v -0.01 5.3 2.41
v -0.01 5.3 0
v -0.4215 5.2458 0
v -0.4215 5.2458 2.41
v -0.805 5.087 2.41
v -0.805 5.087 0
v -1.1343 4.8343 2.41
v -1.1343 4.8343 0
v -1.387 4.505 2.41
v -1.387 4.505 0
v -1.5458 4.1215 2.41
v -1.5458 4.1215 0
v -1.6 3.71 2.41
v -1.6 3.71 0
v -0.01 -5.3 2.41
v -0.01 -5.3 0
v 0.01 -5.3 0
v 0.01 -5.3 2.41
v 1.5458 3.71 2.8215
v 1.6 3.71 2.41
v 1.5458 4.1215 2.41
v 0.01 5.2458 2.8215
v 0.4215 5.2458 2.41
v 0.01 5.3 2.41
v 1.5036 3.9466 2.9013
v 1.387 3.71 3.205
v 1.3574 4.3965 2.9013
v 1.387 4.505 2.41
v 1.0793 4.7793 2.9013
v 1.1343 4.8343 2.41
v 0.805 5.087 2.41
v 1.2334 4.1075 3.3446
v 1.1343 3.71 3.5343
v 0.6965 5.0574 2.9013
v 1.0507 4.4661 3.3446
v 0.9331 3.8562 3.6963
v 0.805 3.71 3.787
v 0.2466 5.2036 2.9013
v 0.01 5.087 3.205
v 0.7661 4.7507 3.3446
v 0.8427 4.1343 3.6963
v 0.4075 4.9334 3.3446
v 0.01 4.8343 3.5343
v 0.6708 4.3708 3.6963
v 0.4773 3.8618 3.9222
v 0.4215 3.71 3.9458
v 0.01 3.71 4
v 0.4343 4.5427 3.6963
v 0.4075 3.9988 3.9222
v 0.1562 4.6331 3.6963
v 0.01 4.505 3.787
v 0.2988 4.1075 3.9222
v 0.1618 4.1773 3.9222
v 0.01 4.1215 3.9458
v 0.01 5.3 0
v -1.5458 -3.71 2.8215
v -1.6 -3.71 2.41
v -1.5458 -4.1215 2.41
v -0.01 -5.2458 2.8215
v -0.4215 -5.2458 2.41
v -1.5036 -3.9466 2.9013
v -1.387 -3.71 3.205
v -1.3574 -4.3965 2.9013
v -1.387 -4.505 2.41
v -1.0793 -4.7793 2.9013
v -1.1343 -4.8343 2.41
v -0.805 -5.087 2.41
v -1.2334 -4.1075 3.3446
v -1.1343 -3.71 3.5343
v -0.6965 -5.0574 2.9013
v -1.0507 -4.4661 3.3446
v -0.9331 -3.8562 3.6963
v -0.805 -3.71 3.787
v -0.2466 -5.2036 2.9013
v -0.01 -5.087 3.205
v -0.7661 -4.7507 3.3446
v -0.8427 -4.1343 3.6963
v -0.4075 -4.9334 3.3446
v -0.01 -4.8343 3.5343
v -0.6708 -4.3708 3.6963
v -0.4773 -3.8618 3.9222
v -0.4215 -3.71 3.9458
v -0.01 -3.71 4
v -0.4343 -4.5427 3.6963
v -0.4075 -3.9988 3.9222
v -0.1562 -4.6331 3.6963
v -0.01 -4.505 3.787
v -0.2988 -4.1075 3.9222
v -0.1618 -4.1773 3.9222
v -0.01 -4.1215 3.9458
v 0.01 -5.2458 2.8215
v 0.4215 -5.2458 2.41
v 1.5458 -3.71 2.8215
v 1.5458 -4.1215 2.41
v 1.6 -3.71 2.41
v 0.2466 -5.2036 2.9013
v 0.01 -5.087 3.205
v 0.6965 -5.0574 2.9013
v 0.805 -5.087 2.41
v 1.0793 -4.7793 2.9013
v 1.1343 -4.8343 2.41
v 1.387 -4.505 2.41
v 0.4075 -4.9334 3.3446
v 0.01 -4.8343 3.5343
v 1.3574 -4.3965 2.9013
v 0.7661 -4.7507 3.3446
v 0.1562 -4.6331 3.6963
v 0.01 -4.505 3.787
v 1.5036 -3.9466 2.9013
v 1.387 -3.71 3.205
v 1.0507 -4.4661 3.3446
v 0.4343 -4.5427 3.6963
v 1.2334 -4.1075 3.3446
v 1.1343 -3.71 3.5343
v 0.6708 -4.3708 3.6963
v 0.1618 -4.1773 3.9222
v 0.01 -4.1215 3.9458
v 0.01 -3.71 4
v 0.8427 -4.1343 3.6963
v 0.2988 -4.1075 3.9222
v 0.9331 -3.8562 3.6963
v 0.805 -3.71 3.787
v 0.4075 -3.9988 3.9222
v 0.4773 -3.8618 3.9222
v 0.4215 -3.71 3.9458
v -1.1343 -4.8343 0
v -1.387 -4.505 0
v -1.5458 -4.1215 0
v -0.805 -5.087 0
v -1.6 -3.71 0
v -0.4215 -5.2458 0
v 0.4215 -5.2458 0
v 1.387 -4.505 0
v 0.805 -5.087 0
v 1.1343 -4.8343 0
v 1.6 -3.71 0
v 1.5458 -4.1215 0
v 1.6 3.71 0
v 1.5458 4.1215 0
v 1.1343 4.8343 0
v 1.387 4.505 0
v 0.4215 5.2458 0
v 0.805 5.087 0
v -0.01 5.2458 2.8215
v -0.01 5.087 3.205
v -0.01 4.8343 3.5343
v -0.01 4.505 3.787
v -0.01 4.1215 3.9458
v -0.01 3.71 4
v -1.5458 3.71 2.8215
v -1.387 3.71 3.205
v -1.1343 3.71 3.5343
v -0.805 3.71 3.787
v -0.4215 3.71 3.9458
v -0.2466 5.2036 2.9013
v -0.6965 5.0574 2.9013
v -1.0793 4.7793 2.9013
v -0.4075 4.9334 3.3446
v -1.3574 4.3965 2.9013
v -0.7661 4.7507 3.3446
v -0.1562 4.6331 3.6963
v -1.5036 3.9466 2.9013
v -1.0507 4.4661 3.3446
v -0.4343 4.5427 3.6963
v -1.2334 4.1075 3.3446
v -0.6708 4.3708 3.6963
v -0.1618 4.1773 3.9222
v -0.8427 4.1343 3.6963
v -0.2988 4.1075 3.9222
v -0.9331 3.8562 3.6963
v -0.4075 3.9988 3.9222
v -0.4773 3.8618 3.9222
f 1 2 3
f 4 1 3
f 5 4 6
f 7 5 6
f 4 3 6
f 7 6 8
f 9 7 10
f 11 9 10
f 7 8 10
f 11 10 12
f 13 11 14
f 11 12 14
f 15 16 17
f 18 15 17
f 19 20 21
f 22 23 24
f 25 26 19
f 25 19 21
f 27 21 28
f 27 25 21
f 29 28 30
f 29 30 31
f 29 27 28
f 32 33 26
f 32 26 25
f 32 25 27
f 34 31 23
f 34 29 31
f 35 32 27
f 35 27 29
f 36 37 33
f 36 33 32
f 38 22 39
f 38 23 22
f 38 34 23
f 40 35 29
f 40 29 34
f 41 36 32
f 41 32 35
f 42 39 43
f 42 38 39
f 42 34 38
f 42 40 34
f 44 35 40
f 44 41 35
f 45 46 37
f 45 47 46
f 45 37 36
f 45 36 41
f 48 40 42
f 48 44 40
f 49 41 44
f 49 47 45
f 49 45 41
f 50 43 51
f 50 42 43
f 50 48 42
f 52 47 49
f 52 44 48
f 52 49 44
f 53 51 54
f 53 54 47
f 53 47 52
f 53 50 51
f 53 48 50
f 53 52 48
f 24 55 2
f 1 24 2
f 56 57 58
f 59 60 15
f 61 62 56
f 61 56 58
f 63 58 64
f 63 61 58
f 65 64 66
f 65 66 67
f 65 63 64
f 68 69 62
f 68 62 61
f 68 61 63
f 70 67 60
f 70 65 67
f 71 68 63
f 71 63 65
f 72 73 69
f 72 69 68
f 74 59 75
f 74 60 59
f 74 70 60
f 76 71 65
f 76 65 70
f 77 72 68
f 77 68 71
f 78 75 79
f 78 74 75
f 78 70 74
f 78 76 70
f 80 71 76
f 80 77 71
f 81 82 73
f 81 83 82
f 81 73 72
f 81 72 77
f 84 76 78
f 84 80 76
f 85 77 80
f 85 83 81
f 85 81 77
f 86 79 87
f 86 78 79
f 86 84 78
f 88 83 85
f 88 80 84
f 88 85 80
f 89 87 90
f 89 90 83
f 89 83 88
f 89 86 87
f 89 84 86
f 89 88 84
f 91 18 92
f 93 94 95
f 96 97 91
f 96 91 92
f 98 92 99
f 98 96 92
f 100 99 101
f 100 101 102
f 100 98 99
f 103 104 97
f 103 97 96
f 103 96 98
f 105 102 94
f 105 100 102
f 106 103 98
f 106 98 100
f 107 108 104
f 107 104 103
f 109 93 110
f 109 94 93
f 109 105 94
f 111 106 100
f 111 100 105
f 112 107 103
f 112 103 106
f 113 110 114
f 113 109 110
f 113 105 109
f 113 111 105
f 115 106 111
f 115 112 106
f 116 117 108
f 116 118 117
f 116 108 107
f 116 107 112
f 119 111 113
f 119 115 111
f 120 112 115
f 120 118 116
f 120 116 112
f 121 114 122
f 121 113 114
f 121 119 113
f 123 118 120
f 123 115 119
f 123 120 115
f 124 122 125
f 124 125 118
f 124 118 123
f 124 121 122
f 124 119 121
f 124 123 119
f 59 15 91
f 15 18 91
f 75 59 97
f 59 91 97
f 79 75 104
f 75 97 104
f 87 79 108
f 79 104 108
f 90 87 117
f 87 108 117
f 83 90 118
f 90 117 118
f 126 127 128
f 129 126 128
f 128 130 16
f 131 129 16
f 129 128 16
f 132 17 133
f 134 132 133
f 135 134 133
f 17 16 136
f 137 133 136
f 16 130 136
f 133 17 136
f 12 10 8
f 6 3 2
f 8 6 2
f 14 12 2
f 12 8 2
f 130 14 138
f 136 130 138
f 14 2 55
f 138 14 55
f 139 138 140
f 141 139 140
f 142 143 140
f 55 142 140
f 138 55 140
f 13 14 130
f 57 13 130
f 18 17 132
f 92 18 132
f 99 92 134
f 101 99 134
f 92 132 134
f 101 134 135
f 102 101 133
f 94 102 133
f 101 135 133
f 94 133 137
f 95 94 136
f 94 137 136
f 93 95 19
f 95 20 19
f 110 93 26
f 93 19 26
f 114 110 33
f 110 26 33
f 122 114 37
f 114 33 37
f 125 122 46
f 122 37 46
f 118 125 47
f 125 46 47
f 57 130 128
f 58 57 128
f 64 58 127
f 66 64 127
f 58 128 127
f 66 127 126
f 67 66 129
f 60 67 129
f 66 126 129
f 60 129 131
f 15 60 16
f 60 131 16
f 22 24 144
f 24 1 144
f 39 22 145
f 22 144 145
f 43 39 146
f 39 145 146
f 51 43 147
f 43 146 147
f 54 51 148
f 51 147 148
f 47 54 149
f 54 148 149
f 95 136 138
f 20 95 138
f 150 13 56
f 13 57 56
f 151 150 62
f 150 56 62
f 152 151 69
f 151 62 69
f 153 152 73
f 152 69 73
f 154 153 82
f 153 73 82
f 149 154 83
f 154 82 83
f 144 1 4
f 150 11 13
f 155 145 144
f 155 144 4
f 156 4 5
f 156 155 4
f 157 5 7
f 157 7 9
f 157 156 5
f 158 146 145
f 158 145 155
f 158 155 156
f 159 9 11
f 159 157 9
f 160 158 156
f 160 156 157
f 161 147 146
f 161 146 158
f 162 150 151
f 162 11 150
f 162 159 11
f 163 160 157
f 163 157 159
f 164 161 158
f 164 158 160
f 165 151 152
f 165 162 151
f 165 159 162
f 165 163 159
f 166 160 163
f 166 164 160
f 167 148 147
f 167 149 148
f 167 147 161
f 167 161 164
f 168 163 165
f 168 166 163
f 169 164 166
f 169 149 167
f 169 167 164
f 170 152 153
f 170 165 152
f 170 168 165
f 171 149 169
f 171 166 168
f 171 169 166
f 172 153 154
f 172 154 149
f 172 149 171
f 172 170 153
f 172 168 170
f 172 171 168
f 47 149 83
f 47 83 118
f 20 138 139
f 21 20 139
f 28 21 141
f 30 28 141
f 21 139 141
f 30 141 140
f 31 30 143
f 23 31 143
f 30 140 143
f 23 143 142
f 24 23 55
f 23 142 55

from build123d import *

# Parameters (mm, degrees)
EXTRUDE_1_DEPTH = 4
FILLET_1_R      = 1.59


with BuildPart() as part:
    # Эскиз1 → Бобышка-Вытянуть1 (new body)
    with BuildSketch(Plane.XY):
        with BuildLine():
            Line((-0.01, -5.3), (0.01, -5.3))
            ThreePointArc((0.01, -5.3), (1.134299782, -4.834299782), (1.6, -3.71))
            Line((1.6, -3.71), (1.6, 3.71))
            ThreePointArc((1.6, 3.71), (1.134299782, 4.834299782), (0.01, 5.3))
            Line((0.01, 5.3), (-0.01, 5.3))
            ThreePointArc((-0.01, 5.3), (-1.134299782, 4.834299782), (-1.6, 3.71))
            Line((-1.6, 3.71), (-1.6, -3.71))
            ThreePointArc((-1.6, -3.71), (-1.134299782, -4.834299782), (-0.01, -5.3))
        make_face()
    extrude(amount=EXTRUDE_1_DEPTH)

    # Скругление1
    fillet_1_edges = [part.edges().sort_by_distance(p)[0] for p in [
        (1.134299782, 4.834299782, 4),
        (0, 5.3, 4),
        (-1.134299782, 4.834299782, 4),
        (-1.6, 0, 4),
        (-1.134299782, -4.834299782, 4),
        (0, -5.3, 4),
        (1.134299782, -4.834299782, 4),
        (1.6, 0, 4),
    ]]
    fillet(fillet_1_edges, radius=FILLET_1_R)


solid = part.part
